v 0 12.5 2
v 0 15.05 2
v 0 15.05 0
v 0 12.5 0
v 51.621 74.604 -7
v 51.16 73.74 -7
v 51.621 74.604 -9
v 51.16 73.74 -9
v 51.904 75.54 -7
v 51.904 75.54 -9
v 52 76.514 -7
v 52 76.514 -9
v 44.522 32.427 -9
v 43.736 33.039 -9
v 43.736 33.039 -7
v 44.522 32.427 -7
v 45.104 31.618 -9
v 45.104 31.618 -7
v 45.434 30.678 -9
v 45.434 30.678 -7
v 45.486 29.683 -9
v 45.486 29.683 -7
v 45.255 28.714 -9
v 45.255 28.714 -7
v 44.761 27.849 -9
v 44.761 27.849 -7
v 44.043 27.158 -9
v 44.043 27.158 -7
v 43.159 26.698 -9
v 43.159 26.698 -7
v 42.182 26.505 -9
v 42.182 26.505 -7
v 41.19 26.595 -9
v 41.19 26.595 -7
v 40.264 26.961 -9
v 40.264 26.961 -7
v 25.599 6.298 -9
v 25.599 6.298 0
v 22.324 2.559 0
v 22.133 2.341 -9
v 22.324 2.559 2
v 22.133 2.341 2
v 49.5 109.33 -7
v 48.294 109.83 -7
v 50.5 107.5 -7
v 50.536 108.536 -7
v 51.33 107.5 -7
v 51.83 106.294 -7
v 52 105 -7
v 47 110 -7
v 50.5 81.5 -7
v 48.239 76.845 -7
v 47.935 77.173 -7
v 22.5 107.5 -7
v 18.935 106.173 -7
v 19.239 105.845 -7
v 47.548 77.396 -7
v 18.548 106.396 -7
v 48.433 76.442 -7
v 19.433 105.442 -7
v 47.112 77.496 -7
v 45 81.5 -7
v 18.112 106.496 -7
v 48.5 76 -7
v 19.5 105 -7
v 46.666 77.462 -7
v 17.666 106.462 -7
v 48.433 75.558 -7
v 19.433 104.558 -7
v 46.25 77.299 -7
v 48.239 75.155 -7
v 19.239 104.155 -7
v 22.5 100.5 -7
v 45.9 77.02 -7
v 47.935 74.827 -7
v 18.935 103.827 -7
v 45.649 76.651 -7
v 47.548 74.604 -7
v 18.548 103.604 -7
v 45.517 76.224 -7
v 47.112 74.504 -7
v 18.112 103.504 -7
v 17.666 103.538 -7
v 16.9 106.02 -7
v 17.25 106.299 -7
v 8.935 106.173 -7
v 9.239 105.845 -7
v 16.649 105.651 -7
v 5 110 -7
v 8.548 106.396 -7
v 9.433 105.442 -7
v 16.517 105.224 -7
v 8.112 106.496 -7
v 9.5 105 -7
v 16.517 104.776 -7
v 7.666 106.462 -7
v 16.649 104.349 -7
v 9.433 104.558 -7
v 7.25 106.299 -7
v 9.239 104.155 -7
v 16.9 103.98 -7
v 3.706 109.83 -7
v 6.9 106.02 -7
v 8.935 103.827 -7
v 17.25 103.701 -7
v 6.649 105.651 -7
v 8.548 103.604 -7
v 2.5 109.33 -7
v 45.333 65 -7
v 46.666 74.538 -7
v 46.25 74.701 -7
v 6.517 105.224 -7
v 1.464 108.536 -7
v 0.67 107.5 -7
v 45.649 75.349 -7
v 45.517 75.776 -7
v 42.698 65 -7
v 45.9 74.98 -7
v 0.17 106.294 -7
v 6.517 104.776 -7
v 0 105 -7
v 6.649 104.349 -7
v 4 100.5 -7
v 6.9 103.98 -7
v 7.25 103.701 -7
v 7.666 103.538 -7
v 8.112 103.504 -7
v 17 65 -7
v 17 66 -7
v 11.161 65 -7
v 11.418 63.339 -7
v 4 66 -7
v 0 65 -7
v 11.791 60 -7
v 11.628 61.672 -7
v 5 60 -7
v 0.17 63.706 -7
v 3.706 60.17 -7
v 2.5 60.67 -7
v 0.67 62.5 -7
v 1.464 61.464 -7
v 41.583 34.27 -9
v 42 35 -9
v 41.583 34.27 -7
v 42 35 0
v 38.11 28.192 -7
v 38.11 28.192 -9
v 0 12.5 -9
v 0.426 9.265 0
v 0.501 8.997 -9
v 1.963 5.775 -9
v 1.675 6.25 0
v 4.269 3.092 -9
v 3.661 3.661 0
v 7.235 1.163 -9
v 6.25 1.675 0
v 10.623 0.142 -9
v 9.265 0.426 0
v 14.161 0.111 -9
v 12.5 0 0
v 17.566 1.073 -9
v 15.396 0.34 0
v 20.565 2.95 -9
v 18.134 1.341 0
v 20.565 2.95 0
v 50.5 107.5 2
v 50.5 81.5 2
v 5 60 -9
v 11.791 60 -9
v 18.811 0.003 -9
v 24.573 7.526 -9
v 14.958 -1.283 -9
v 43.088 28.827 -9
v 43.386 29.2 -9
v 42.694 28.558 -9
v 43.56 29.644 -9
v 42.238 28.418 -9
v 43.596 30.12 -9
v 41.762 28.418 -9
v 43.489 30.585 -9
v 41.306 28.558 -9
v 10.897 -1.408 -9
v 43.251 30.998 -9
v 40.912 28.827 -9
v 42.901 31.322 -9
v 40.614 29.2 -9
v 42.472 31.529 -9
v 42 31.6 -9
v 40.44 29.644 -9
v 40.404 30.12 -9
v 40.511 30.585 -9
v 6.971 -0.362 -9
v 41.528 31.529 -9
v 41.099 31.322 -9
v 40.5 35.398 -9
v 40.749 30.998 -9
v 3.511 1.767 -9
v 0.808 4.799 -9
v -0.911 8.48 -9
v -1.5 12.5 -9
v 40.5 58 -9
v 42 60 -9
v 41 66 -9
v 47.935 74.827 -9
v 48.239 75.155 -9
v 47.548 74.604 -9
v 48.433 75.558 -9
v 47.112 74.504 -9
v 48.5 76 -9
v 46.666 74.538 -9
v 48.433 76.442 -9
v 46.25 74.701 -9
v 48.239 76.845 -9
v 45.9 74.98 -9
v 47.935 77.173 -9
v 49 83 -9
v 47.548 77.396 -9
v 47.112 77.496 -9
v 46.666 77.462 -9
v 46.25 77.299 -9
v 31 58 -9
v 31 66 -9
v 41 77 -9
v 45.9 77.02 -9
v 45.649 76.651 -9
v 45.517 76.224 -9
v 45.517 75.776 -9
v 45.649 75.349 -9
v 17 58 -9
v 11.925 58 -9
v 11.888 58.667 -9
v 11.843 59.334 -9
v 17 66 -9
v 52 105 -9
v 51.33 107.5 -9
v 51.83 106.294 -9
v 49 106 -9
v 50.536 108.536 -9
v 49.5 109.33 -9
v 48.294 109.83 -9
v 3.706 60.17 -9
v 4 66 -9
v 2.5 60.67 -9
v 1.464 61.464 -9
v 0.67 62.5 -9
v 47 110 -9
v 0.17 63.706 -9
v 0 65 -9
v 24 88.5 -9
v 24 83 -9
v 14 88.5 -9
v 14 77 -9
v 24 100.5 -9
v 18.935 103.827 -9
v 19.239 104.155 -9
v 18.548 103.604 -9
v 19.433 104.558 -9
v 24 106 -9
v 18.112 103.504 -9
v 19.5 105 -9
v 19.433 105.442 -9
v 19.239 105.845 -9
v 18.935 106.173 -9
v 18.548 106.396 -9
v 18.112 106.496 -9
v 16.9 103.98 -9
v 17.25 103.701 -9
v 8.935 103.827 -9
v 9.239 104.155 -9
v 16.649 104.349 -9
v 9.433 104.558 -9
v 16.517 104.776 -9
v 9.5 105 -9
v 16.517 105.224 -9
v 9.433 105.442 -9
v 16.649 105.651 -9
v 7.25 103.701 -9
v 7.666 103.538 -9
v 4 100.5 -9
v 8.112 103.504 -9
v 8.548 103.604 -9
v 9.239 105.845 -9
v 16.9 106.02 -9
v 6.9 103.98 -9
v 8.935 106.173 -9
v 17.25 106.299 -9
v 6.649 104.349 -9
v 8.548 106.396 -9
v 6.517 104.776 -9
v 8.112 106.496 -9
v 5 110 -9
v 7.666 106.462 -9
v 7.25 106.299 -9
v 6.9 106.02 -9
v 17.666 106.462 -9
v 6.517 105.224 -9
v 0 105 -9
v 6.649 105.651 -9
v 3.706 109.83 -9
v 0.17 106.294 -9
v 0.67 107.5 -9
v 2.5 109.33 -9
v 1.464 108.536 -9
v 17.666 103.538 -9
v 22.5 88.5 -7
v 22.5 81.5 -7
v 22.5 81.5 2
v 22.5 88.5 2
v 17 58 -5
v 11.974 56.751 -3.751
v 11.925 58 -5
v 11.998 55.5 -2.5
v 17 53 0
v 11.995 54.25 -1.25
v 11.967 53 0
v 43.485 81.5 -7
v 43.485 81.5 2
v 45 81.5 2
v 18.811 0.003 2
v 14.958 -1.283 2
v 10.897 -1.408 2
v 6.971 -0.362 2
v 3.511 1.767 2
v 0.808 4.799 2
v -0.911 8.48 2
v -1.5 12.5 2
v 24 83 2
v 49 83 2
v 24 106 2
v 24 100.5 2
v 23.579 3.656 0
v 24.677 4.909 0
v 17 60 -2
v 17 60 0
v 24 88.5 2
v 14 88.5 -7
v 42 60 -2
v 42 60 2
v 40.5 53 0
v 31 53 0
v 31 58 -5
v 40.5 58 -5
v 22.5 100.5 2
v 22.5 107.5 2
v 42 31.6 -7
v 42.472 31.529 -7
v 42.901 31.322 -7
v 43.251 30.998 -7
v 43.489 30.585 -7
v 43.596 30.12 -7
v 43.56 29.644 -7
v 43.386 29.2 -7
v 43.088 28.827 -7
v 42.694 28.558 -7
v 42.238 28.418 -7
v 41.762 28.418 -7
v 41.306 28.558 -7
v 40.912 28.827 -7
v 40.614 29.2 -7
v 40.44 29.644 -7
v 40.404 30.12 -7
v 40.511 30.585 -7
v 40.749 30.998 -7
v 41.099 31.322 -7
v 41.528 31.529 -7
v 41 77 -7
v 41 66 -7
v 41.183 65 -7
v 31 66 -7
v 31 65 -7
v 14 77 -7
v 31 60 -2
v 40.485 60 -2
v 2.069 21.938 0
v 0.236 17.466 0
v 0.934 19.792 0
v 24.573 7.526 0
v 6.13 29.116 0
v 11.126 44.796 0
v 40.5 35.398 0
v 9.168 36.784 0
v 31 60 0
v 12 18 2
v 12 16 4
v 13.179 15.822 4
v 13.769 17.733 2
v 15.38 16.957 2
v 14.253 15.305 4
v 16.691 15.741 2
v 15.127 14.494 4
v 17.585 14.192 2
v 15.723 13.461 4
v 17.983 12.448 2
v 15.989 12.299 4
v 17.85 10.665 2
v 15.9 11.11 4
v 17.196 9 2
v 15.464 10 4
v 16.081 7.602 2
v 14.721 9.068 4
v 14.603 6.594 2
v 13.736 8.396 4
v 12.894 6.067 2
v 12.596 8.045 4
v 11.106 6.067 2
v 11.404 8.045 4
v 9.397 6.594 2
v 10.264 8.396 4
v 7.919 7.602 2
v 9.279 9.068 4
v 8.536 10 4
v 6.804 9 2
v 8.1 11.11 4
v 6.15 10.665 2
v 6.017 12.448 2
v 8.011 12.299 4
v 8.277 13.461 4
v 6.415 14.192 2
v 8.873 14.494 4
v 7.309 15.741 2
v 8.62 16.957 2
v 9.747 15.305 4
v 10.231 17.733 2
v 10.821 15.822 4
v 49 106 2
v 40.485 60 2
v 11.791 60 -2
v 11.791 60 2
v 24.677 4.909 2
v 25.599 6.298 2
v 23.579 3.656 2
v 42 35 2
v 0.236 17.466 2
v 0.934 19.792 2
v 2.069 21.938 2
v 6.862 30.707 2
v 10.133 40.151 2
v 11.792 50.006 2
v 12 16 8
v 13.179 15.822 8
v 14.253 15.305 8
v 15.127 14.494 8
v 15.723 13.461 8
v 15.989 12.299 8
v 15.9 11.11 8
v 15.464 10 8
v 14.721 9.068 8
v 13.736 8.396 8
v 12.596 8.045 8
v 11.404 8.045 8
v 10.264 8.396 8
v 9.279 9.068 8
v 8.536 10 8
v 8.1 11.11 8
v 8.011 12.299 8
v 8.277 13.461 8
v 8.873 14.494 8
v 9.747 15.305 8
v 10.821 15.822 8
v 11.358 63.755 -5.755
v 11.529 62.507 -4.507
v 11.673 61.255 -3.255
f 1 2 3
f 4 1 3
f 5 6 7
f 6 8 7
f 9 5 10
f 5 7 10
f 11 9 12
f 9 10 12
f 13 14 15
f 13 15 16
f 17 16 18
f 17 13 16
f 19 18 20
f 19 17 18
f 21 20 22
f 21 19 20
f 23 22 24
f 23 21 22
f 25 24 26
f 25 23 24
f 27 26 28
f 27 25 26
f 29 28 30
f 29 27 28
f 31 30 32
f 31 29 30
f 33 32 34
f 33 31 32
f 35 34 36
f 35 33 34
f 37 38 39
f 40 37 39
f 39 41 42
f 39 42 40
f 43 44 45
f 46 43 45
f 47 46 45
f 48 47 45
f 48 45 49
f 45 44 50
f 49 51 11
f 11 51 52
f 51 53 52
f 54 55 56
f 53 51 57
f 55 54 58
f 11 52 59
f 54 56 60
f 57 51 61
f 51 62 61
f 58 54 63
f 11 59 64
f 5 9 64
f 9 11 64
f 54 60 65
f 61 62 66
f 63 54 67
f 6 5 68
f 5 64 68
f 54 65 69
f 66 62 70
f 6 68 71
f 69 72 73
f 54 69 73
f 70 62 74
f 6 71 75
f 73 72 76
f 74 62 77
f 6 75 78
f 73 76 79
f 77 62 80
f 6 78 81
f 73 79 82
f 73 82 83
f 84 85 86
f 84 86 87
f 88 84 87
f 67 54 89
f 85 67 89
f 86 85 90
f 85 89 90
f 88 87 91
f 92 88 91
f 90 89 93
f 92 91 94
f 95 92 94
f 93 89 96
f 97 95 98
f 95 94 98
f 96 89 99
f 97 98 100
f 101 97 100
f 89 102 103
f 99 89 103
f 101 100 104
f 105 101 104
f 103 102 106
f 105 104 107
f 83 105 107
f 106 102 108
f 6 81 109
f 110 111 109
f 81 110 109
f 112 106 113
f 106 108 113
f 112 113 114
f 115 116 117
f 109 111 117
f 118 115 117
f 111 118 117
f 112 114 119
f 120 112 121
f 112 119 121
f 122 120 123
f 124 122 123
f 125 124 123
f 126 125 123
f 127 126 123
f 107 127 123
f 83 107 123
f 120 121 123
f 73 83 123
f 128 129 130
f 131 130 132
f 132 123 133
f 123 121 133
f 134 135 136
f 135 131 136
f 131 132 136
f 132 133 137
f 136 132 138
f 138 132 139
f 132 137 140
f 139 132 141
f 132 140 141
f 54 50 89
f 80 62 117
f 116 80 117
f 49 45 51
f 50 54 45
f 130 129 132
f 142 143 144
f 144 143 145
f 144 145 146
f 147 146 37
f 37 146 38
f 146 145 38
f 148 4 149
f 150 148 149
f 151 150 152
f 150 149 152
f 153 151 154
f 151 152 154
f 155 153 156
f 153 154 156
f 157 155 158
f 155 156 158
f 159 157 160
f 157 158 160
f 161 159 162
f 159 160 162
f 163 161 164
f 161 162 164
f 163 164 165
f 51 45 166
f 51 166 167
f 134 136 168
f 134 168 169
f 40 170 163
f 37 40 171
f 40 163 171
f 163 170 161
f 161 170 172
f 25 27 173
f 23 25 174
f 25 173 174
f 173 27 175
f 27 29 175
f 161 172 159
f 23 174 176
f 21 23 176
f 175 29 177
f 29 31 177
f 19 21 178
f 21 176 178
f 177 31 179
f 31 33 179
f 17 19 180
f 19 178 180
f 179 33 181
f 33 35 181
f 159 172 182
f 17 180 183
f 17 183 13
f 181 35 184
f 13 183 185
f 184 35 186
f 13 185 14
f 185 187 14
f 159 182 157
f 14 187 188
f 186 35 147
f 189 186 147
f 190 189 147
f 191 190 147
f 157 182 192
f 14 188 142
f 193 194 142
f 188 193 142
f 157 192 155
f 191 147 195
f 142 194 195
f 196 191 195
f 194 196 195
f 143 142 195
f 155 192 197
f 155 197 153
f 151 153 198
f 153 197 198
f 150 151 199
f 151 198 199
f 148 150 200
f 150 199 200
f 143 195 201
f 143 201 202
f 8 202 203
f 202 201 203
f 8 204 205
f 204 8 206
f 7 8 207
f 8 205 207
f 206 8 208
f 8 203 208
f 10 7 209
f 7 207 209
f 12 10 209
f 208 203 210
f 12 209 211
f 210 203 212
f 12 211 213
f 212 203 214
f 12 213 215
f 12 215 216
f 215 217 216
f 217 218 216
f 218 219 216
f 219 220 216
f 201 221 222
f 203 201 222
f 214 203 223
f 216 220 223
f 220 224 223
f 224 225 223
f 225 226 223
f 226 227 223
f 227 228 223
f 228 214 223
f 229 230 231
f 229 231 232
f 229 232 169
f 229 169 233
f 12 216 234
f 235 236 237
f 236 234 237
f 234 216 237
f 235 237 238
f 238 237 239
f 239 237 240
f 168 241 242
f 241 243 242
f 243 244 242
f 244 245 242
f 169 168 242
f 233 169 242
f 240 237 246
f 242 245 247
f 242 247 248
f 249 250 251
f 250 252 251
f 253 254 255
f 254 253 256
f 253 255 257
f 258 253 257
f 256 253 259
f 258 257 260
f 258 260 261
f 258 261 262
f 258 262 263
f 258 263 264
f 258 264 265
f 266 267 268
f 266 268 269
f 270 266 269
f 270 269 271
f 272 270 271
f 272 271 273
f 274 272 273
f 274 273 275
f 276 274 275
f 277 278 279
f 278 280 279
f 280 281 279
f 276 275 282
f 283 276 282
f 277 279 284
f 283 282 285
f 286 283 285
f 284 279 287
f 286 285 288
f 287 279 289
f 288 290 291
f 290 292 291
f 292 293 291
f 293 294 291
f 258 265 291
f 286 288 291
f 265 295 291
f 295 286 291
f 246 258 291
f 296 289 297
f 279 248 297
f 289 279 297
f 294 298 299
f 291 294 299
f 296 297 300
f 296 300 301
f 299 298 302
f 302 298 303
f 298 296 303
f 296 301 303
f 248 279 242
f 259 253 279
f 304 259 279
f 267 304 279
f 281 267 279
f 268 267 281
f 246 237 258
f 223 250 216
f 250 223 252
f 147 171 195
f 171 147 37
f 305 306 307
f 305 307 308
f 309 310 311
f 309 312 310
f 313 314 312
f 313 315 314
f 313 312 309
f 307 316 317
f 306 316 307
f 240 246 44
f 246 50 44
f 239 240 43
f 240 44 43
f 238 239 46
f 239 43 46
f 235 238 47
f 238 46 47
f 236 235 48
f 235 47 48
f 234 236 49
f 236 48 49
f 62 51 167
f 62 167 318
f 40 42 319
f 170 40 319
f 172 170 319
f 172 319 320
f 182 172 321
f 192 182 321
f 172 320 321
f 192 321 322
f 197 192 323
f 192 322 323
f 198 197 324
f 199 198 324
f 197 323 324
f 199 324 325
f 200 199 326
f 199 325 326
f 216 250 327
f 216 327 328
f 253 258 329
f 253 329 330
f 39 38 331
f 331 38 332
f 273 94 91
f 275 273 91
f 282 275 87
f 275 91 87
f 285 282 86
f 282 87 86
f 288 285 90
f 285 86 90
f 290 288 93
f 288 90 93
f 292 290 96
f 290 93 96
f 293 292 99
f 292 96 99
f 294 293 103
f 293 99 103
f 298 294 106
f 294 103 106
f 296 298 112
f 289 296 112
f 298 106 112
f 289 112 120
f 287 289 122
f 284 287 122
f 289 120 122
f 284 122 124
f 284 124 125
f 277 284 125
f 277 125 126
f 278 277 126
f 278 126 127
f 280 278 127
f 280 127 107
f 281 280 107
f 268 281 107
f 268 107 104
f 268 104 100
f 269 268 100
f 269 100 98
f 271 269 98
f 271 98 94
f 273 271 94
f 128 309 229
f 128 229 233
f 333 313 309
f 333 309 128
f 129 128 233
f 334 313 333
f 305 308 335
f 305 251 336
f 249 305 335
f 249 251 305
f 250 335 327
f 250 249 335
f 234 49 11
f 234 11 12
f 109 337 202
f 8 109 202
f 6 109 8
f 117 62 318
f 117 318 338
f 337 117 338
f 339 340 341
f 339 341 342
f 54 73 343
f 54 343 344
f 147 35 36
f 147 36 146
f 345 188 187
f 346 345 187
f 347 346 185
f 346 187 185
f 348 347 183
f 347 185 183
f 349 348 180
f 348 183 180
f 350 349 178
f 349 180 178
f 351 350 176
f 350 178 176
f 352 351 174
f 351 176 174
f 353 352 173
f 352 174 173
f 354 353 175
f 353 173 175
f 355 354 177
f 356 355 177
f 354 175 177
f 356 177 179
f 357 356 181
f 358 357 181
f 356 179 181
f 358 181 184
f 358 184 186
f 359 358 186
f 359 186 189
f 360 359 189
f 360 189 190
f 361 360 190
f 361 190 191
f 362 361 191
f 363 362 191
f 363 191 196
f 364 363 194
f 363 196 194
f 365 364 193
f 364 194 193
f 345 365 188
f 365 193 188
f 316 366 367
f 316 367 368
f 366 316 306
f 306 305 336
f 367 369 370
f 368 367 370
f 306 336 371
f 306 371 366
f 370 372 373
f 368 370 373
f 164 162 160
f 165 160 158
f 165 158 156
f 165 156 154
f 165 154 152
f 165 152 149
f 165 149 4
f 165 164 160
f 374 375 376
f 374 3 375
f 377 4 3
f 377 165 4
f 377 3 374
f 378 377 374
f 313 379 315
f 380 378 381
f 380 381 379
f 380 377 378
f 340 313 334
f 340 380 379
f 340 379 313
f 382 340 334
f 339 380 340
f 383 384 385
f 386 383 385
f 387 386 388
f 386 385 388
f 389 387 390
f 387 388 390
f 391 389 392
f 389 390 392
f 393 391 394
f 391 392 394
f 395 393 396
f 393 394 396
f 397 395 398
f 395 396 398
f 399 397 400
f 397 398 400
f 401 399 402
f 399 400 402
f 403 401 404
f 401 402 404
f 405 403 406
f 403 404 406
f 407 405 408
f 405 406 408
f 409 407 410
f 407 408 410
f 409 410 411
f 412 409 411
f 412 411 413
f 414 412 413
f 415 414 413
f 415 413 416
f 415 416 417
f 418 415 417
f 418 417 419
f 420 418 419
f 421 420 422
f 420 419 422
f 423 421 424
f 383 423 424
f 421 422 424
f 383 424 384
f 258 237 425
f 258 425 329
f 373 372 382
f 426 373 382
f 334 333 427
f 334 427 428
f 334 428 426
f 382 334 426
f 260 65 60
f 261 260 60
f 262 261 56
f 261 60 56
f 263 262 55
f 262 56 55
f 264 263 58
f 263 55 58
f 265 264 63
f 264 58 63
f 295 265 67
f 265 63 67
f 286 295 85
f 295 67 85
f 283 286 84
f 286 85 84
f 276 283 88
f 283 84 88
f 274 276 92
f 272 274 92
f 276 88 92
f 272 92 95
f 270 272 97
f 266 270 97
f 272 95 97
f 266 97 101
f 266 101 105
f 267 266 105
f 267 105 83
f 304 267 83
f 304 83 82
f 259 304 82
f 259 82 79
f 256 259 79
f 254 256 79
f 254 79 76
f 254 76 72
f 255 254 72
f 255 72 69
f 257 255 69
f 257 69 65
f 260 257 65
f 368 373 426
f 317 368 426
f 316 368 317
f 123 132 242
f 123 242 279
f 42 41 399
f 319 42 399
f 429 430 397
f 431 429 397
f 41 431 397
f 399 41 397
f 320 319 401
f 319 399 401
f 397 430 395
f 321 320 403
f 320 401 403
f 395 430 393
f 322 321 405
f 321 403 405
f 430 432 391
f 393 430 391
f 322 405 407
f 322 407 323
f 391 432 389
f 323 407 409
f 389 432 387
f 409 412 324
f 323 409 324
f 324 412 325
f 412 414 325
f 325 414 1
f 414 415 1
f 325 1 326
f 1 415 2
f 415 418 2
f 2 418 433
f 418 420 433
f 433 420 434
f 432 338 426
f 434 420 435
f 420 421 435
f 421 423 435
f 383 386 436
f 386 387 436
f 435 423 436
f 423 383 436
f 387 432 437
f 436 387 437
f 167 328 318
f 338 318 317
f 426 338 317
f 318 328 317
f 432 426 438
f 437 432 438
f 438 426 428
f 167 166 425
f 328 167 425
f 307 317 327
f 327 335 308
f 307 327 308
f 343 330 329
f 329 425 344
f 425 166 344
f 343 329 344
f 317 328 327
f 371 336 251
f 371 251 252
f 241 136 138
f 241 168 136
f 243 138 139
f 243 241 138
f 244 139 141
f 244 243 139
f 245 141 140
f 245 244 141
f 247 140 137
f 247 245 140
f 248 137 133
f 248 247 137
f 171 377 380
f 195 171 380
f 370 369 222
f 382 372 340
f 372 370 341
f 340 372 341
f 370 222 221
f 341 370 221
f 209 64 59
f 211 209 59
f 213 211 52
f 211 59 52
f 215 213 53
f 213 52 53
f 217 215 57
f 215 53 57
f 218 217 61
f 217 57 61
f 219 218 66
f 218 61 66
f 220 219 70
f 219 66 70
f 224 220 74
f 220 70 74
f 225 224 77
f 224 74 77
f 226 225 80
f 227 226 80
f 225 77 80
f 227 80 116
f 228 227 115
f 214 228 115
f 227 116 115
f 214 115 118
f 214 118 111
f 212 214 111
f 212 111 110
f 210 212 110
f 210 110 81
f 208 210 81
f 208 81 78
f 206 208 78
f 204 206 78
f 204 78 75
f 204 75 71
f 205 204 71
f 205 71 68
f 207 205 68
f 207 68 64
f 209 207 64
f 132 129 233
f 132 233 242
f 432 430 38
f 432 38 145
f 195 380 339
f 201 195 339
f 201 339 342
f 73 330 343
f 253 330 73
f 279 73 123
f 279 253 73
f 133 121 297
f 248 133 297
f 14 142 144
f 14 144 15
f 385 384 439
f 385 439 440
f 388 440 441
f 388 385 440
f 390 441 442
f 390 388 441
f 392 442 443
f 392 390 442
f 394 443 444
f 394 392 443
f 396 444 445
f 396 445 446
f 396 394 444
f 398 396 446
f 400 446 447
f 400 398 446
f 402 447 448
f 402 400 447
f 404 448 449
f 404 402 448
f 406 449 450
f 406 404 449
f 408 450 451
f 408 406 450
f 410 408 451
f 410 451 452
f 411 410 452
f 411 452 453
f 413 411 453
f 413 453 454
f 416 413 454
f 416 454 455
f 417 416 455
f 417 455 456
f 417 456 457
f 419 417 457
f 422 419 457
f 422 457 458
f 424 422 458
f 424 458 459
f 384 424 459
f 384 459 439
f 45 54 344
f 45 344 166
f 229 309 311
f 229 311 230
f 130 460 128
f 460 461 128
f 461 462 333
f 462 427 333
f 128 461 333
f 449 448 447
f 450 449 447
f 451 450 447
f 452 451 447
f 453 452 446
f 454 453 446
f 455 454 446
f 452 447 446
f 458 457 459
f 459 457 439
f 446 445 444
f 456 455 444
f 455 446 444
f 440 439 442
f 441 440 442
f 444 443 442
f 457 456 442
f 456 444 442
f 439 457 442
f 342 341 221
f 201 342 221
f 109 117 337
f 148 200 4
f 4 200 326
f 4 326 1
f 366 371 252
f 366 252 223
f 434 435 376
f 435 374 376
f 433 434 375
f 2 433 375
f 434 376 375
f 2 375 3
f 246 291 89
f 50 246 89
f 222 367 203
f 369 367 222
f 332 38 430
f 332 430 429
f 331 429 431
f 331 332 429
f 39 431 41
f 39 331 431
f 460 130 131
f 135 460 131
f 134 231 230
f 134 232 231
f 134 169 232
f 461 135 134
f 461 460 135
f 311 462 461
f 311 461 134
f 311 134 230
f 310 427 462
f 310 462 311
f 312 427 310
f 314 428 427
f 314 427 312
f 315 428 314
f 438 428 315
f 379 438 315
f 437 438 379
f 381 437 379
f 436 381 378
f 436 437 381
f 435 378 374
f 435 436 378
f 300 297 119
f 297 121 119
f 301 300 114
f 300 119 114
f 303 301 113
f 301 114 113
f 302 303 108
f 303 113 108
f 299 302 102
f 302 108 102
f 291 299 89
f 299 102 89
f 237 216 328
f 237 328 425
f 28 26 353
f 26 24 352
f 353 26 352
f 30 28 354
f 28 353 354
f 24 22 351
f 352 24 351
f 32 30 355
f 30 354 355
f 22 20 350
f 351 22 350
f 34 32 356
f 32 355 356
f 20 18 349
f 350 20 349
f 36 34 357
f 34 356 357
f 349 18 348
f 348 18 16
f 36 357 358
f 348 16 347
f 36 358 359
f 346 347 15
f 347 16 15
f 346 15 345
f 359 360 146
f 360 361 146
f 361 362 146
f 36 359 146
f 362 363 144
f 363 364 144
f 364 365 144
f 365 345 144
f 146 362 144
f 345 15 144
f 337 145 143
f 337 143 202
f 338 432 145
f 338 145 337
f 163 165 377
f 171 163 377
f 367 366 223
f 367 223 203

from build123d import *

# Parameters (mm, degrees)
EXTRUDE_1_DEPTH                 = 52
CUT_EXTRUDE_1_REACH             = 124.004
CUT_EXTRUDE_1_DIRECTION_2_DEPTH = 7
SKETCH_3_R                      = 1.5
CUT_EXTRUDE_2_DEPTH             = 123.167917229
SKETCH_5_R                      = 4
EXTRUDE_3_DEPTH                 = 8
FILLET_1_R                      = 5
CHAMFER_1_SIZE                  = 5
FILLET_2_R                      = 12.5
EXTRUDE_2_DEPTH                 = 9
CHAMFER_2_SIZE                  = 5
EXTRUDE_4_DEPTH                 = 9
EXTRUDE_4_DEPTH_BACK            = 2
CHAMFER_3_SIZE                  = 2
SKETCH_7_R                      = 1.6
EXTRUDE_5_DEPTH                 = 2


with BuildPart() as part:
    # 草图1 → 凸台-拉伸1 (new body)
    with BuildSketch(Plane(origin=(0, 0, 0), x_dir=(0, 0, -1), z_dir=(1, 0, 0))):
        Polygon((0, 0), (0, 58), (9, 58), (9, 110), (7, 110), (7, 60), (-2, 60), (-2, 0), align=None)
    extrude(amount=EXTRUDE_1_DEPTH)

    # 草图2 → 切除-拉伸1 (cut, up to next)
    with BuildSketch(Plane.XY.offset(-7), mode=Mode.PRIVATE) as cut_extrude_1_sk1:
        Polygon((24, 106), (49, 106), (49, 83), (24, 83), (24, 88.5), (14, 88.5), (14, 77), (41, 77), (41, 66), (31, 66), (31, 58), (17, 58), (17, 66), (4, 66), (4, 100.5), (24, 100.5), align=None)
    cut_extrude_1_tool1 = extrude(cut_extrude_1_sk1.sketch, amount=-CUT_EXTRUDE_1_REACH, mode=Mode.PRIVATE) & part.part
    add(cut_extrude_1_tool1.solids().sort_by_distance((25.692202, 84.595066, -7))[0], mode=Mode.SUBTRACT)

    # 草图2 → 切除-拉伸1 direction 2 (cut)
    with BuildSketch(Plane.XY.offset(-7)):
        Polygon((24, 106), (49, 106), (49, 83), (24, 83), (24, 88.5), (14, 88.5), (14, 77), (41, 77), (41, 66), (31, 66), (31, 58), (17, 58), (17, 66), (4, 66), (4, 100.5), (24, 100.5), align=None)
    extrude(amount=CUT_EXTRUDE_1_DIRECTION_2_DEPTH, mode=Mode.SUBTRACT)

    # 草图3 → 切除-拉伸2 (cut, through all)
    with BuildSketch(Plane.XY.offset(2)):
        with Locations((8, 105)):
            Circle(SKETCH_3_R)
        with Locations((18, 105)):
            Circle(SKETCH_3_R)
        with Locations((47, 76)):
            Circle(SKETCH_3_R)
        with BuildLine():
            Line((0, 60), (11.791303716, 60))
            ThreePointArc((11.791303716, 60), (9.662737441, 38.416613409), (0, 19))
            Line((0, 19), (0, 60))
        make_face()
        Polygon((42, 35), (42, 60), (52, 75), (52, 0), (22, 0), align=None)
    extrude(amount=-CUT_EXTRUDE_2_DEPTH, mode=Mode.SUBTRACT)

    # 草图5 → 凸台-拉伸3 (add)
    with BuildSketch(Plane(origin=(0, 0, 0), x_dir=(-1, 0, 0), z_dir=(0, 0, -1))):
        with Locations(Location((-12, 12, 0), (0, 0, 90))):
            Circle(SKETCH_5_R)
    extrude(amount=-EXTRUDE_3_DEPTH)

    # 圆角1
    fillet_1_edges = [part.edges().sort_by_distance(p)[0] for p in [
        (52, 75, -8),
        (0, 60, -8),
        (52, 110, -8),
        (0, 110, -8),
    ]]
    fillet(fillet_1_edges, radius=FILLET_1_R)

    # 倒角1
    chamfer_1_edges = [part.edges().sort_by_distance(p)[0] for p in [
        (14.395651858, 60, -7),
        (36.5, 60, -7),
    ]]
    chamfer(chamfer_1_edges, length=CHAMFER_1_SIZE)

    # 圆角2
    fillet_2_edges = [part.edges().sort_by_distance(p)[0] for p in [
        (22, 0, 1),
        (0, 0, 1),
        (0, 19, 1),
    ]]
    fillet(fillet_2_edges, radius=FILLET_2_R)

    # 草图4 → 凸台-拉伸2 (add)
    with BuildSketch(Plane.XY.offset(-7)):
        Polygon((24, 88.5), (24, 83), (49, 83), (49, 106), (24, 106), (24, 100.5), (22.5, 100.5), (22.5, 107.5), (50.5, 107.5), (50.5, 81.5), (45, 81.5), (42, 60), (40.485467906, 60), (43.485467906, 81.5), (22.5, 81.5), (22.5, 88.5), align=None)
    extrude(amount=EXTRUDE_2_DEPTH)

    # 倒角2
    chamfer_2_edges = [part.edges().sort_by_distance(p)[0] for p in [
        (14.462476533, 58, 0),
        (36.5, 58, 0),
    ]]
    chamfer(chamfer_2_edges, length=CHAMFER_2_SIZE)

    # 草图6 → 凸台-拉伸4 (add, two sides: drawn at the far end of the back side and taken through both)
    with BuildSketch(Plane(origin=(0, 0, 0), x_dir=(-1, 0, 0), z_dir=(0, 0, -1)).offset(-EXTRUDE_4_DEPTH_BACK)):
        with BuildLine():
            Line((-40.5, 60), (-42, 60))
            Line((-42, 60), (-42, 35))
            Line((-42, 35), (-25.599007583, 6.298263271))
            Line((-25.599007583, 6.298263271), (-22.133485774, 2.341459168))
            ThreePointArc((-22.133485774, 2.341459168), (-6.971383575, -0.362130478), (1.5, 12.5))
            Line((1.5, 12.5), (0, 12.5))
            ThreePointArc((0, 12.5), (-7.235227504, 1.162797057), (-20.565147291, 2.949952923))
            Line((-20.565147291, 2.949952923), (-24.572792271, 7.525733129))
            Line((-24.572792271, 7.525733129), (-40.5, 35.398346656))
            Line((-40.5, 35.398346656), (-40.5, 60))
        make_face()
    extrude(amount=EXTRUDE_4_DEPTH + EXTRUDE_4_DEPTH_BACK)

    # 倒角3
    chamfer_3_edges = [part.edges().sort_by_distance(p)[0] for p in [
        (12, 8, 2),
    ]]
    chamfer(chamfer_3_edges, length=CHAMFER_3_SIZE)

    # 草图7 → 凸台-拉伸5 (add)
    with BuildSketch(Plane(origin=(0, 0, -9), x_dir=(-1, 0, 0), z_dir=(0, 0, -1))):
        with BuildLine():
            Line((-41.58264013, 34.269620228), (-43.736486284, 33.038850997))
            ThreePointArc((-43.736486284, 33.038850997), (-45.038850997, 28.263513716), (-40.263513716, 26.961149003))
            Line((-40.263513716, 26.961149003), (-38.109667562, 28.191918233))
            Line((-38.109667562, 28.191918233), (-41.58264013, 34.269620228))
        make_face()
        with Locations(Location((-42, 30, 0), (0, 0, 90))):
            Circle(SKETCH_7_R, mode=Mode.SUBTRACT)
    extrude(amount=-EXTRUDE_5_DEPTH)


solid = part.part
